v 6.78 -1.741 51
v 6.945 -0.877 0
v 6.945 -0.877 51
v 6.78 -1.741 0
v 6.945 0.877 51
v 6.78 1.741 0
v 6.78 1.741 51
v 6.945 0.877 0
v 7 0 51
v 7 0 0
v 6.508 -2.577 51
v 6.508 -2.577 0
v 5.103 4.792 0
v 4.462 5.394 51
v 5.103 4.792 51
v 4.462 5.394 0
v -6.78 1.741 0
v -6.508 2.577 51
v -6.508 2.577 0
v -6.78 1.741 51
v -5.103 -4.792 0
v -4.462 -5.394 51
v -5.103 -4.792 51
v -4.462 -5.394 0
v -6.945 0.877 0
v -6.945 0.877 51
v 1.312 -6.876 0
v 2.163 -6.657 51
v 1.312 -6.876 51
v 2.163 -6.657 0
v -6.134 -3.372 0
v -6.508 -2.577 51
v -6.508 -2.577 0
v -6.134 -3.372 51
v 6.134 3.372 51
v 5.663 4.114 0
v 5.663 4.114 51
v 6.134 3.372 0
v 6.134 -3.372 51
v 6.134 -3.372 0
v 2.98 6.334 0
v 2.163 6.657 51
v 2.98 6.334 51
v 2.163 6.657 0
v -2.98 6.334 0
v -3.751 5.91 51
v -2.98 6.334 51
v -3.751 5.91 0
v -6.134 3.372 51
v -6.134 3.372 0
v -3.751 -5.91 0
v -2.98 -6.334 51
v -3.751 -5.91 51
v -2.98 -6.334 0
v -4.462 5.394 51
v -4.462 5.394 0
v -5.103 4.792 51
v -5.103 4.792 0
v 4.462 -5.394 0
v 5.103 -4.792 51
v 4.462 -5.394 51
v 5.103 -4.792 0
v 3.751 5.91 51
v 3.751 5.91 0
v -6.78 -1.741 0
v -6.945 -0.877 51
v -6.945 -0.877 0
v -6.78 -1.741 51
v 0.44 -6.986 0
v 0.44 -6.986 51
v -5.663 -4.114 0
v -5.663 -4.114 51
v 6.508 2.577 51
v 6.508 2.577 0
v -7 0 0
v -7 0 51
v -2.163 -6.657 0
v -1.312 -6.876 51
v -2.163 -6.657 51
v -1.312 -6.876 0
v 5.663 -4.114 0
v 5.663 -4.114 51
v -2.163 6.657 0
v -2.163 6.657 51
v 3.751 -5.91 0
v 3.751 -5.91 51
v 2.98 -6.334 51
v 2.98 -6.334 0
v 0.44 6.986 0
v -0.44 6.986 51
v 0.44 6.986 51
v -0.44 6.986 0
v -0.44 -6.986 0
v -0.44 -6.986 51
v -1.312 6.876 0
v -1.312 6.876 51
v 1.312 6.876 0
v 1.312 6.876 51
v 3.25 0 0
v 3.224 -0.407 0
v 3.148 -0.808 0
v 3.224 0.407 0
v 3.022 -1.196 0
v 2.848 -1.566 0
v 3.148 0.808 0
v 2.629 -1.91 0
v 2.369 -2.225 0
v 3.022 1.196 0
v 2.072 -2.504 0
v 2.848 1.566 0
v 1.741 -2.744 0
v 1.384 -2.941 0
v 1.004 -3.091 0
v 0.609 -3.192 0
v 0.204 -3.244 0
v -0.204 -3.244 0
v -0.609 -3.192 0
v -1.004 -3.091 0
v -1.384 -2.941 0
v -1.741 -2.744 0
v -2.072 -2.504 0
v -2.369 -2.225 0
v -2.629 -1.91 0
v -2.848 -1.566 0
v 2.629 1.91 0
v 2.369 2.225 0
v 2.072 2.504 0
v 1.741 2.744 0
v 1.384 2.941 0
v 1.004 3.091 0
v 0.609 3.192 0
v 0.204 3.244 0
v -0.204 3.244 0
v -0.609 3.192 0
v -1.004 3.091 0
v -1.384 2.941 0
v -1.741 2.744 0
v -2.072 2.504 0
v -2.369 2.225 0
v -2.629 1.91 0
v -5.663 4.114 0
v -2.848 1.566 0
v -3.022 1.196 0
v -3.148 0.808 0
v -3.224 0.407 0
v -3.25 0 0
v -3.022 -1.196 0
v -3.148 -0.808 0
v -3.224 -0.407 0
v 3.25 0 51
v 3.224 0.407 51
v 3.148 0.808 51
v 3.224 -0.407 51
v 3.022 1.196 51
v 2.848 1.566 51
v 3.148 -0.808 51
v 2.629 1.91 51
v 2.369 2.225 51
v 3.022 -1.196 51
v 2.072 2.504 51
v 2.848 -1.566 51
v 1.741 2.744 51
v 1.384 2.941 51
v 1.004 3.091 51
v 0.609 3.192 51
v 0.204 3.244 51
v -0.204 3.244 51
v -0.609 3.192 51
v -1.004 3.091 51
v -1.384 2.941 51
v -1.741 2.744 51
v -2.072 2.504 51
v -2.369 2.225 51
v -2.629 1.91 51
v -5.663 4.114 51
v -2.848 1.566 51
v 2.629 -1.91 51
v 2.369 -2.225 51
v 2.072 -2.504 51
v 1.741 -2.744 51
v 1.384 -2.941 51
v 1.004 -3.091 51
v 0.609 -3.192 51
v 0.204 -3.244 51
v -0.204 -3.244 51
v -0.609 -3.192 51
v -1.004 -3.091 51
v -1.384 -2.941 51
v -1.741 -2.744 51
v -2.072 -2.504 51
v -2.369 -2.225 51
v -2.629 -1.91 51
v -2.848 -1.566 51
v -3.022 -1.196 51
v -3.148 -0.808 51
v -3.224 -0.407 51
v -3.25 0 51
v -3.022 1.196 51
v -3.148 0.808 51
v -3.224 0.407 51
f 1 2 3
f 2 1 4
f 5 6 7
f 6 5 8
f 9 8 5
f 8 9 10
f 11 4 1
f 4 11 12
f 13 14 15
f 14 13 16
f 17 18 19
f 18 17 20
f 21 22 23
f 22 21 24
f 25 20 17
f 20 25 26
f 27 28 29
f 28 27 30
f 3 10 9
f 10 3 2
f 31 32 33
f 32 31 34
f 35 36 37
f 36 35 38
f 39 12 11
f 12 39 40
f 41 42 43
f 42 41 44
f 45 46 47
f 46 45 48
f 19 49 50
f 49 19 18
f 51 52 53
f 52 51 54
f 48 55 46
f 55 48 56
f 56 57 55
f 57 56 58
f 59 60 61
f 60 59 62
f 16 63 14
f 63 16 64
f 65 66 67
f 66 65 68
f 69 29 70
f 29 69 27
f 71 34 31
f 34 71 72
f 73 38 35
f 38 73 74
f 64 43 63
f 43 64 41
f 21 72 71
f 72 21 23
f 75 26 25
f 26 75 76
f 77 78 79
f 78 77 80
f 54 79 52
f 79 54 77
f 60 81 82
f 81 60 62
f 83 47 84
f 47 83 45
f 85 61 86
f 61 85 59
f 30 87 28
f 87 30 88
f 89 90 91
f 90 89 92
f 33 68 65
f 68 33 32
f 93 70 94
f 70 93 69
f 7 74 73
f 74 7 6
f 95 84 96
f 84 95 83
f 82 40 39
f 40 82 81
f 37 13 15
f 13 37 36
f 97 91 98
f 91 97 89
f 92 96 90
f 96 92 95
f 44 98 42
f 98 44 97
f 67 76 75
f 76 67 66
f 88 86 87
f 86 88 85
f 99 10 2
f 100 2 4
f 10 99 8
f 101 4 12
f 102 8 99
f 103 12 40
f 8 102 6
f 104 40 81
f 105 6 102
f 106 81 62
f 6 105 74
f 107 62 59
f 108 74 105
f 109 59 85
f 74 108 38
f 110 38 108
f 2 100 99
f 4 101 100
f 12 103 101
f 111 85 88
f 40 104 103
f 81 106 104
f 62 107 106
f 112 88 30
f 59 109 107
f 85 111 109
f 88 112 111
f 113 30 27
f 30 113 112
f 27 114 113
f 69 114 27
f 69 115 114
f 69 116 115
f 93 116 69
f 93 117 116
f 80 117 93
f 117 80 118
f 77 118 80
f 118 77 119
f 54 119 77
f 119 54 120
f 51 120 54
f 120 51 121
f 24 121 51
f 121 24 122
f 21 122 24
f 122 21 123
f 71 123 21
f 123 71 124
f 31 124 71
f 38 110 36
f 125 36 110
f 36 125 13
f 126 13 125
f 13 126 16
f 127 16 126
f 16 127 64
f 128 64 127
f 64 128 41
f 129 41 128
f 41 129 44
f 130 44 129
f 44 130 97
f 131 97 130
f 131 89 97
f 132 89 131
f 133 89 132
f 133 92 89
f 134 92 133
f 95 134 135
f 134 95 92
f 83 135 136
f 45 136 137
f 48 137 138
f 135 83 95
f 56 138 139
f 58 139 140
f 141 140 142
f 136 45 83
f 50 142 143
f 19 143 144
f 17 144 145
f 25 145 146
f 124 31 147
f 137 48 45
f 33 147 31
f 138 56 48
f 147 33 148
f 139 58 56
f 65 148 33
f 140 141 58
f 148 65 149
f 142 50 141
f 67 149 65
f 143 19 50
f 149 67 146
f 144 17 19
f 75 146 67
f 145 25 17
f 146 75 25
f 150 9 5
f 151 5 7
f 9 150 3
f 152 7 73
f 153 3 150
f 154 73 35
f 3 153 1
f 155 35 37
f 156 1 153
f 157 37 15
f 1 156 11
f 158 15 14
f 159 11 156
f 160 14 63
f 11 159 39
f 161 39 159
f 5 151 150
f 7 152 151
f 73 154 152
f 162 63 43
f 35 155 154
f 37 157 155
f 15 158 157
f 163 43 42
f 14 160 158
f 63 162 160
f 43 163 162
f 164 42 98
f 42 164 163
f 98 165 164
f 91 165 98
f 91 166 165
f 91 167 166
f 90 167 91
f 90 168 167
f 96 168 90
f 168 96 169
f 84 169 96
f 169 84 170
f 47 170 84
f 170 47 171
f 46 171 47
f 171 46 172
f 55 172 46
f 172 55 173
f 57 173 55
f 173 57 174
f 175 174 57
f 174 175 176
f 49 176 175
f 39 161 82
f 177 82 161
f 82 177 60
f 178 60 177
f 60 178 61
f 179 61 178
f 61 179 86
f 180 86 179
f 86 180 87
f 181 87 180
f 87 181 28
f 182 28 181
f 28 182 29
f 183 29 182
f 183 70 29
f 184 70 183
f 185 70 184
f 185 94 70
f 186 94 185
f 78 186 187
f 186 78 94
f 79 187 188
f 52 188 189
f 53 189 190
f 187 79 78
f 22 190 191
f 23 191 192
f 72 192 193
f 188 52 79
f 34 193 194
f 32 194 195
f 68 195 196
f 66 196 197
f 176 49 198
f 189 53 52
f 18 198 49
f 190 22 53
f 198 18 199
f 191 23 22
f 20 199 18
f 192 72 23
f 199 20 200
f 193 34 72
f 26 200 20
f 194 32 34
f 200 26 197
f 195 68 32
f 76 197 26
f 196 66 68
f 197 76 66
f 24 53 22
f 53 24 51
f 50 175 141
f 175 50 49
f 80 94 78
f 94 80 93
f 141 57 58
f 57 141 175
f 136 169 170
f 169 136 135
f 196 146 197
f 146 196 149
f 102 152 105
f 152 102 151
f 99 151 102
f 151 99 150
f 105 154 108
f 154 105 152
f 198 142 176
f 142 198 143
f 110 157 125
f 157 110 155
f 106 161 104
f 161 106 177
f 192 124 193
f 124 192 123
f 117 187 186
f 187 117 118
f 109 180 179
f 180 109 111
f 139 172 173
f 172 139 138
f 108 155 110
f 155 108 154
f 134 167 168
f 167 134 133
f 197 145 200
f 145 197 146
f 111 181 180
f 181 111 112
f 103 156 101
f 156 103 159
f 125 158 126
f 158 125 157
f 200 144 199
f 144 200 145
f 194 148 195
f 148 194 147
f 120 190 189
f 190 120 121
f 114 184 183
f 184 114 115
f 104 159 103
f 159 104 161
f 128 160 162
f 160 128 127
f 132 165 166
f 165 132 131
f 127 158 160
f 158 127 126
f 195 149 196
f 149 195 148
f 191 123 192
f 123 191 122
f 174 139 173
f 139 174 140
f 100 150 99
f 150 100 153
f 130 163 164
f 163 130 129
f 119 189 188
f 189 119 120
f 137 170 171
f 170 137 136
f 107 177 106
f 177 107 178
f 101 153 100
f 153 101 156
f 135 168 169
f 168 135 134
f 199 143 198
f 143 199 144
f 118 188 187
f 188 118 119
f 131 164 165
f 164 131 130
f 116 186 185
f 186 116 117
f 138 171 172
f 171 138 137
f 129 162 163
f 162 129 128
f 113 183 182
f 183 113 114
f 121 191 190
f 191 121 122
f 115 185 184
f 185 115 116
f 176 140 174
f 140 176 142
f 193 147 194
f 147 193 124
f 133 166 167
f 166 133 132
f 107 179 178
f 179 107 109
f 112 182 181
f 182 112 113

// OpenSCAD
$fn = 50;


difference() {
	union() {
		cylinder(h = 51, r = 7.0000000000);
	}
	union() {
		translate(v = [0.0000000000, 0.0000000000, -100.0000000000]) {
			cylinder(h = 200, r = 3.2500000000);
		}
	}
}
